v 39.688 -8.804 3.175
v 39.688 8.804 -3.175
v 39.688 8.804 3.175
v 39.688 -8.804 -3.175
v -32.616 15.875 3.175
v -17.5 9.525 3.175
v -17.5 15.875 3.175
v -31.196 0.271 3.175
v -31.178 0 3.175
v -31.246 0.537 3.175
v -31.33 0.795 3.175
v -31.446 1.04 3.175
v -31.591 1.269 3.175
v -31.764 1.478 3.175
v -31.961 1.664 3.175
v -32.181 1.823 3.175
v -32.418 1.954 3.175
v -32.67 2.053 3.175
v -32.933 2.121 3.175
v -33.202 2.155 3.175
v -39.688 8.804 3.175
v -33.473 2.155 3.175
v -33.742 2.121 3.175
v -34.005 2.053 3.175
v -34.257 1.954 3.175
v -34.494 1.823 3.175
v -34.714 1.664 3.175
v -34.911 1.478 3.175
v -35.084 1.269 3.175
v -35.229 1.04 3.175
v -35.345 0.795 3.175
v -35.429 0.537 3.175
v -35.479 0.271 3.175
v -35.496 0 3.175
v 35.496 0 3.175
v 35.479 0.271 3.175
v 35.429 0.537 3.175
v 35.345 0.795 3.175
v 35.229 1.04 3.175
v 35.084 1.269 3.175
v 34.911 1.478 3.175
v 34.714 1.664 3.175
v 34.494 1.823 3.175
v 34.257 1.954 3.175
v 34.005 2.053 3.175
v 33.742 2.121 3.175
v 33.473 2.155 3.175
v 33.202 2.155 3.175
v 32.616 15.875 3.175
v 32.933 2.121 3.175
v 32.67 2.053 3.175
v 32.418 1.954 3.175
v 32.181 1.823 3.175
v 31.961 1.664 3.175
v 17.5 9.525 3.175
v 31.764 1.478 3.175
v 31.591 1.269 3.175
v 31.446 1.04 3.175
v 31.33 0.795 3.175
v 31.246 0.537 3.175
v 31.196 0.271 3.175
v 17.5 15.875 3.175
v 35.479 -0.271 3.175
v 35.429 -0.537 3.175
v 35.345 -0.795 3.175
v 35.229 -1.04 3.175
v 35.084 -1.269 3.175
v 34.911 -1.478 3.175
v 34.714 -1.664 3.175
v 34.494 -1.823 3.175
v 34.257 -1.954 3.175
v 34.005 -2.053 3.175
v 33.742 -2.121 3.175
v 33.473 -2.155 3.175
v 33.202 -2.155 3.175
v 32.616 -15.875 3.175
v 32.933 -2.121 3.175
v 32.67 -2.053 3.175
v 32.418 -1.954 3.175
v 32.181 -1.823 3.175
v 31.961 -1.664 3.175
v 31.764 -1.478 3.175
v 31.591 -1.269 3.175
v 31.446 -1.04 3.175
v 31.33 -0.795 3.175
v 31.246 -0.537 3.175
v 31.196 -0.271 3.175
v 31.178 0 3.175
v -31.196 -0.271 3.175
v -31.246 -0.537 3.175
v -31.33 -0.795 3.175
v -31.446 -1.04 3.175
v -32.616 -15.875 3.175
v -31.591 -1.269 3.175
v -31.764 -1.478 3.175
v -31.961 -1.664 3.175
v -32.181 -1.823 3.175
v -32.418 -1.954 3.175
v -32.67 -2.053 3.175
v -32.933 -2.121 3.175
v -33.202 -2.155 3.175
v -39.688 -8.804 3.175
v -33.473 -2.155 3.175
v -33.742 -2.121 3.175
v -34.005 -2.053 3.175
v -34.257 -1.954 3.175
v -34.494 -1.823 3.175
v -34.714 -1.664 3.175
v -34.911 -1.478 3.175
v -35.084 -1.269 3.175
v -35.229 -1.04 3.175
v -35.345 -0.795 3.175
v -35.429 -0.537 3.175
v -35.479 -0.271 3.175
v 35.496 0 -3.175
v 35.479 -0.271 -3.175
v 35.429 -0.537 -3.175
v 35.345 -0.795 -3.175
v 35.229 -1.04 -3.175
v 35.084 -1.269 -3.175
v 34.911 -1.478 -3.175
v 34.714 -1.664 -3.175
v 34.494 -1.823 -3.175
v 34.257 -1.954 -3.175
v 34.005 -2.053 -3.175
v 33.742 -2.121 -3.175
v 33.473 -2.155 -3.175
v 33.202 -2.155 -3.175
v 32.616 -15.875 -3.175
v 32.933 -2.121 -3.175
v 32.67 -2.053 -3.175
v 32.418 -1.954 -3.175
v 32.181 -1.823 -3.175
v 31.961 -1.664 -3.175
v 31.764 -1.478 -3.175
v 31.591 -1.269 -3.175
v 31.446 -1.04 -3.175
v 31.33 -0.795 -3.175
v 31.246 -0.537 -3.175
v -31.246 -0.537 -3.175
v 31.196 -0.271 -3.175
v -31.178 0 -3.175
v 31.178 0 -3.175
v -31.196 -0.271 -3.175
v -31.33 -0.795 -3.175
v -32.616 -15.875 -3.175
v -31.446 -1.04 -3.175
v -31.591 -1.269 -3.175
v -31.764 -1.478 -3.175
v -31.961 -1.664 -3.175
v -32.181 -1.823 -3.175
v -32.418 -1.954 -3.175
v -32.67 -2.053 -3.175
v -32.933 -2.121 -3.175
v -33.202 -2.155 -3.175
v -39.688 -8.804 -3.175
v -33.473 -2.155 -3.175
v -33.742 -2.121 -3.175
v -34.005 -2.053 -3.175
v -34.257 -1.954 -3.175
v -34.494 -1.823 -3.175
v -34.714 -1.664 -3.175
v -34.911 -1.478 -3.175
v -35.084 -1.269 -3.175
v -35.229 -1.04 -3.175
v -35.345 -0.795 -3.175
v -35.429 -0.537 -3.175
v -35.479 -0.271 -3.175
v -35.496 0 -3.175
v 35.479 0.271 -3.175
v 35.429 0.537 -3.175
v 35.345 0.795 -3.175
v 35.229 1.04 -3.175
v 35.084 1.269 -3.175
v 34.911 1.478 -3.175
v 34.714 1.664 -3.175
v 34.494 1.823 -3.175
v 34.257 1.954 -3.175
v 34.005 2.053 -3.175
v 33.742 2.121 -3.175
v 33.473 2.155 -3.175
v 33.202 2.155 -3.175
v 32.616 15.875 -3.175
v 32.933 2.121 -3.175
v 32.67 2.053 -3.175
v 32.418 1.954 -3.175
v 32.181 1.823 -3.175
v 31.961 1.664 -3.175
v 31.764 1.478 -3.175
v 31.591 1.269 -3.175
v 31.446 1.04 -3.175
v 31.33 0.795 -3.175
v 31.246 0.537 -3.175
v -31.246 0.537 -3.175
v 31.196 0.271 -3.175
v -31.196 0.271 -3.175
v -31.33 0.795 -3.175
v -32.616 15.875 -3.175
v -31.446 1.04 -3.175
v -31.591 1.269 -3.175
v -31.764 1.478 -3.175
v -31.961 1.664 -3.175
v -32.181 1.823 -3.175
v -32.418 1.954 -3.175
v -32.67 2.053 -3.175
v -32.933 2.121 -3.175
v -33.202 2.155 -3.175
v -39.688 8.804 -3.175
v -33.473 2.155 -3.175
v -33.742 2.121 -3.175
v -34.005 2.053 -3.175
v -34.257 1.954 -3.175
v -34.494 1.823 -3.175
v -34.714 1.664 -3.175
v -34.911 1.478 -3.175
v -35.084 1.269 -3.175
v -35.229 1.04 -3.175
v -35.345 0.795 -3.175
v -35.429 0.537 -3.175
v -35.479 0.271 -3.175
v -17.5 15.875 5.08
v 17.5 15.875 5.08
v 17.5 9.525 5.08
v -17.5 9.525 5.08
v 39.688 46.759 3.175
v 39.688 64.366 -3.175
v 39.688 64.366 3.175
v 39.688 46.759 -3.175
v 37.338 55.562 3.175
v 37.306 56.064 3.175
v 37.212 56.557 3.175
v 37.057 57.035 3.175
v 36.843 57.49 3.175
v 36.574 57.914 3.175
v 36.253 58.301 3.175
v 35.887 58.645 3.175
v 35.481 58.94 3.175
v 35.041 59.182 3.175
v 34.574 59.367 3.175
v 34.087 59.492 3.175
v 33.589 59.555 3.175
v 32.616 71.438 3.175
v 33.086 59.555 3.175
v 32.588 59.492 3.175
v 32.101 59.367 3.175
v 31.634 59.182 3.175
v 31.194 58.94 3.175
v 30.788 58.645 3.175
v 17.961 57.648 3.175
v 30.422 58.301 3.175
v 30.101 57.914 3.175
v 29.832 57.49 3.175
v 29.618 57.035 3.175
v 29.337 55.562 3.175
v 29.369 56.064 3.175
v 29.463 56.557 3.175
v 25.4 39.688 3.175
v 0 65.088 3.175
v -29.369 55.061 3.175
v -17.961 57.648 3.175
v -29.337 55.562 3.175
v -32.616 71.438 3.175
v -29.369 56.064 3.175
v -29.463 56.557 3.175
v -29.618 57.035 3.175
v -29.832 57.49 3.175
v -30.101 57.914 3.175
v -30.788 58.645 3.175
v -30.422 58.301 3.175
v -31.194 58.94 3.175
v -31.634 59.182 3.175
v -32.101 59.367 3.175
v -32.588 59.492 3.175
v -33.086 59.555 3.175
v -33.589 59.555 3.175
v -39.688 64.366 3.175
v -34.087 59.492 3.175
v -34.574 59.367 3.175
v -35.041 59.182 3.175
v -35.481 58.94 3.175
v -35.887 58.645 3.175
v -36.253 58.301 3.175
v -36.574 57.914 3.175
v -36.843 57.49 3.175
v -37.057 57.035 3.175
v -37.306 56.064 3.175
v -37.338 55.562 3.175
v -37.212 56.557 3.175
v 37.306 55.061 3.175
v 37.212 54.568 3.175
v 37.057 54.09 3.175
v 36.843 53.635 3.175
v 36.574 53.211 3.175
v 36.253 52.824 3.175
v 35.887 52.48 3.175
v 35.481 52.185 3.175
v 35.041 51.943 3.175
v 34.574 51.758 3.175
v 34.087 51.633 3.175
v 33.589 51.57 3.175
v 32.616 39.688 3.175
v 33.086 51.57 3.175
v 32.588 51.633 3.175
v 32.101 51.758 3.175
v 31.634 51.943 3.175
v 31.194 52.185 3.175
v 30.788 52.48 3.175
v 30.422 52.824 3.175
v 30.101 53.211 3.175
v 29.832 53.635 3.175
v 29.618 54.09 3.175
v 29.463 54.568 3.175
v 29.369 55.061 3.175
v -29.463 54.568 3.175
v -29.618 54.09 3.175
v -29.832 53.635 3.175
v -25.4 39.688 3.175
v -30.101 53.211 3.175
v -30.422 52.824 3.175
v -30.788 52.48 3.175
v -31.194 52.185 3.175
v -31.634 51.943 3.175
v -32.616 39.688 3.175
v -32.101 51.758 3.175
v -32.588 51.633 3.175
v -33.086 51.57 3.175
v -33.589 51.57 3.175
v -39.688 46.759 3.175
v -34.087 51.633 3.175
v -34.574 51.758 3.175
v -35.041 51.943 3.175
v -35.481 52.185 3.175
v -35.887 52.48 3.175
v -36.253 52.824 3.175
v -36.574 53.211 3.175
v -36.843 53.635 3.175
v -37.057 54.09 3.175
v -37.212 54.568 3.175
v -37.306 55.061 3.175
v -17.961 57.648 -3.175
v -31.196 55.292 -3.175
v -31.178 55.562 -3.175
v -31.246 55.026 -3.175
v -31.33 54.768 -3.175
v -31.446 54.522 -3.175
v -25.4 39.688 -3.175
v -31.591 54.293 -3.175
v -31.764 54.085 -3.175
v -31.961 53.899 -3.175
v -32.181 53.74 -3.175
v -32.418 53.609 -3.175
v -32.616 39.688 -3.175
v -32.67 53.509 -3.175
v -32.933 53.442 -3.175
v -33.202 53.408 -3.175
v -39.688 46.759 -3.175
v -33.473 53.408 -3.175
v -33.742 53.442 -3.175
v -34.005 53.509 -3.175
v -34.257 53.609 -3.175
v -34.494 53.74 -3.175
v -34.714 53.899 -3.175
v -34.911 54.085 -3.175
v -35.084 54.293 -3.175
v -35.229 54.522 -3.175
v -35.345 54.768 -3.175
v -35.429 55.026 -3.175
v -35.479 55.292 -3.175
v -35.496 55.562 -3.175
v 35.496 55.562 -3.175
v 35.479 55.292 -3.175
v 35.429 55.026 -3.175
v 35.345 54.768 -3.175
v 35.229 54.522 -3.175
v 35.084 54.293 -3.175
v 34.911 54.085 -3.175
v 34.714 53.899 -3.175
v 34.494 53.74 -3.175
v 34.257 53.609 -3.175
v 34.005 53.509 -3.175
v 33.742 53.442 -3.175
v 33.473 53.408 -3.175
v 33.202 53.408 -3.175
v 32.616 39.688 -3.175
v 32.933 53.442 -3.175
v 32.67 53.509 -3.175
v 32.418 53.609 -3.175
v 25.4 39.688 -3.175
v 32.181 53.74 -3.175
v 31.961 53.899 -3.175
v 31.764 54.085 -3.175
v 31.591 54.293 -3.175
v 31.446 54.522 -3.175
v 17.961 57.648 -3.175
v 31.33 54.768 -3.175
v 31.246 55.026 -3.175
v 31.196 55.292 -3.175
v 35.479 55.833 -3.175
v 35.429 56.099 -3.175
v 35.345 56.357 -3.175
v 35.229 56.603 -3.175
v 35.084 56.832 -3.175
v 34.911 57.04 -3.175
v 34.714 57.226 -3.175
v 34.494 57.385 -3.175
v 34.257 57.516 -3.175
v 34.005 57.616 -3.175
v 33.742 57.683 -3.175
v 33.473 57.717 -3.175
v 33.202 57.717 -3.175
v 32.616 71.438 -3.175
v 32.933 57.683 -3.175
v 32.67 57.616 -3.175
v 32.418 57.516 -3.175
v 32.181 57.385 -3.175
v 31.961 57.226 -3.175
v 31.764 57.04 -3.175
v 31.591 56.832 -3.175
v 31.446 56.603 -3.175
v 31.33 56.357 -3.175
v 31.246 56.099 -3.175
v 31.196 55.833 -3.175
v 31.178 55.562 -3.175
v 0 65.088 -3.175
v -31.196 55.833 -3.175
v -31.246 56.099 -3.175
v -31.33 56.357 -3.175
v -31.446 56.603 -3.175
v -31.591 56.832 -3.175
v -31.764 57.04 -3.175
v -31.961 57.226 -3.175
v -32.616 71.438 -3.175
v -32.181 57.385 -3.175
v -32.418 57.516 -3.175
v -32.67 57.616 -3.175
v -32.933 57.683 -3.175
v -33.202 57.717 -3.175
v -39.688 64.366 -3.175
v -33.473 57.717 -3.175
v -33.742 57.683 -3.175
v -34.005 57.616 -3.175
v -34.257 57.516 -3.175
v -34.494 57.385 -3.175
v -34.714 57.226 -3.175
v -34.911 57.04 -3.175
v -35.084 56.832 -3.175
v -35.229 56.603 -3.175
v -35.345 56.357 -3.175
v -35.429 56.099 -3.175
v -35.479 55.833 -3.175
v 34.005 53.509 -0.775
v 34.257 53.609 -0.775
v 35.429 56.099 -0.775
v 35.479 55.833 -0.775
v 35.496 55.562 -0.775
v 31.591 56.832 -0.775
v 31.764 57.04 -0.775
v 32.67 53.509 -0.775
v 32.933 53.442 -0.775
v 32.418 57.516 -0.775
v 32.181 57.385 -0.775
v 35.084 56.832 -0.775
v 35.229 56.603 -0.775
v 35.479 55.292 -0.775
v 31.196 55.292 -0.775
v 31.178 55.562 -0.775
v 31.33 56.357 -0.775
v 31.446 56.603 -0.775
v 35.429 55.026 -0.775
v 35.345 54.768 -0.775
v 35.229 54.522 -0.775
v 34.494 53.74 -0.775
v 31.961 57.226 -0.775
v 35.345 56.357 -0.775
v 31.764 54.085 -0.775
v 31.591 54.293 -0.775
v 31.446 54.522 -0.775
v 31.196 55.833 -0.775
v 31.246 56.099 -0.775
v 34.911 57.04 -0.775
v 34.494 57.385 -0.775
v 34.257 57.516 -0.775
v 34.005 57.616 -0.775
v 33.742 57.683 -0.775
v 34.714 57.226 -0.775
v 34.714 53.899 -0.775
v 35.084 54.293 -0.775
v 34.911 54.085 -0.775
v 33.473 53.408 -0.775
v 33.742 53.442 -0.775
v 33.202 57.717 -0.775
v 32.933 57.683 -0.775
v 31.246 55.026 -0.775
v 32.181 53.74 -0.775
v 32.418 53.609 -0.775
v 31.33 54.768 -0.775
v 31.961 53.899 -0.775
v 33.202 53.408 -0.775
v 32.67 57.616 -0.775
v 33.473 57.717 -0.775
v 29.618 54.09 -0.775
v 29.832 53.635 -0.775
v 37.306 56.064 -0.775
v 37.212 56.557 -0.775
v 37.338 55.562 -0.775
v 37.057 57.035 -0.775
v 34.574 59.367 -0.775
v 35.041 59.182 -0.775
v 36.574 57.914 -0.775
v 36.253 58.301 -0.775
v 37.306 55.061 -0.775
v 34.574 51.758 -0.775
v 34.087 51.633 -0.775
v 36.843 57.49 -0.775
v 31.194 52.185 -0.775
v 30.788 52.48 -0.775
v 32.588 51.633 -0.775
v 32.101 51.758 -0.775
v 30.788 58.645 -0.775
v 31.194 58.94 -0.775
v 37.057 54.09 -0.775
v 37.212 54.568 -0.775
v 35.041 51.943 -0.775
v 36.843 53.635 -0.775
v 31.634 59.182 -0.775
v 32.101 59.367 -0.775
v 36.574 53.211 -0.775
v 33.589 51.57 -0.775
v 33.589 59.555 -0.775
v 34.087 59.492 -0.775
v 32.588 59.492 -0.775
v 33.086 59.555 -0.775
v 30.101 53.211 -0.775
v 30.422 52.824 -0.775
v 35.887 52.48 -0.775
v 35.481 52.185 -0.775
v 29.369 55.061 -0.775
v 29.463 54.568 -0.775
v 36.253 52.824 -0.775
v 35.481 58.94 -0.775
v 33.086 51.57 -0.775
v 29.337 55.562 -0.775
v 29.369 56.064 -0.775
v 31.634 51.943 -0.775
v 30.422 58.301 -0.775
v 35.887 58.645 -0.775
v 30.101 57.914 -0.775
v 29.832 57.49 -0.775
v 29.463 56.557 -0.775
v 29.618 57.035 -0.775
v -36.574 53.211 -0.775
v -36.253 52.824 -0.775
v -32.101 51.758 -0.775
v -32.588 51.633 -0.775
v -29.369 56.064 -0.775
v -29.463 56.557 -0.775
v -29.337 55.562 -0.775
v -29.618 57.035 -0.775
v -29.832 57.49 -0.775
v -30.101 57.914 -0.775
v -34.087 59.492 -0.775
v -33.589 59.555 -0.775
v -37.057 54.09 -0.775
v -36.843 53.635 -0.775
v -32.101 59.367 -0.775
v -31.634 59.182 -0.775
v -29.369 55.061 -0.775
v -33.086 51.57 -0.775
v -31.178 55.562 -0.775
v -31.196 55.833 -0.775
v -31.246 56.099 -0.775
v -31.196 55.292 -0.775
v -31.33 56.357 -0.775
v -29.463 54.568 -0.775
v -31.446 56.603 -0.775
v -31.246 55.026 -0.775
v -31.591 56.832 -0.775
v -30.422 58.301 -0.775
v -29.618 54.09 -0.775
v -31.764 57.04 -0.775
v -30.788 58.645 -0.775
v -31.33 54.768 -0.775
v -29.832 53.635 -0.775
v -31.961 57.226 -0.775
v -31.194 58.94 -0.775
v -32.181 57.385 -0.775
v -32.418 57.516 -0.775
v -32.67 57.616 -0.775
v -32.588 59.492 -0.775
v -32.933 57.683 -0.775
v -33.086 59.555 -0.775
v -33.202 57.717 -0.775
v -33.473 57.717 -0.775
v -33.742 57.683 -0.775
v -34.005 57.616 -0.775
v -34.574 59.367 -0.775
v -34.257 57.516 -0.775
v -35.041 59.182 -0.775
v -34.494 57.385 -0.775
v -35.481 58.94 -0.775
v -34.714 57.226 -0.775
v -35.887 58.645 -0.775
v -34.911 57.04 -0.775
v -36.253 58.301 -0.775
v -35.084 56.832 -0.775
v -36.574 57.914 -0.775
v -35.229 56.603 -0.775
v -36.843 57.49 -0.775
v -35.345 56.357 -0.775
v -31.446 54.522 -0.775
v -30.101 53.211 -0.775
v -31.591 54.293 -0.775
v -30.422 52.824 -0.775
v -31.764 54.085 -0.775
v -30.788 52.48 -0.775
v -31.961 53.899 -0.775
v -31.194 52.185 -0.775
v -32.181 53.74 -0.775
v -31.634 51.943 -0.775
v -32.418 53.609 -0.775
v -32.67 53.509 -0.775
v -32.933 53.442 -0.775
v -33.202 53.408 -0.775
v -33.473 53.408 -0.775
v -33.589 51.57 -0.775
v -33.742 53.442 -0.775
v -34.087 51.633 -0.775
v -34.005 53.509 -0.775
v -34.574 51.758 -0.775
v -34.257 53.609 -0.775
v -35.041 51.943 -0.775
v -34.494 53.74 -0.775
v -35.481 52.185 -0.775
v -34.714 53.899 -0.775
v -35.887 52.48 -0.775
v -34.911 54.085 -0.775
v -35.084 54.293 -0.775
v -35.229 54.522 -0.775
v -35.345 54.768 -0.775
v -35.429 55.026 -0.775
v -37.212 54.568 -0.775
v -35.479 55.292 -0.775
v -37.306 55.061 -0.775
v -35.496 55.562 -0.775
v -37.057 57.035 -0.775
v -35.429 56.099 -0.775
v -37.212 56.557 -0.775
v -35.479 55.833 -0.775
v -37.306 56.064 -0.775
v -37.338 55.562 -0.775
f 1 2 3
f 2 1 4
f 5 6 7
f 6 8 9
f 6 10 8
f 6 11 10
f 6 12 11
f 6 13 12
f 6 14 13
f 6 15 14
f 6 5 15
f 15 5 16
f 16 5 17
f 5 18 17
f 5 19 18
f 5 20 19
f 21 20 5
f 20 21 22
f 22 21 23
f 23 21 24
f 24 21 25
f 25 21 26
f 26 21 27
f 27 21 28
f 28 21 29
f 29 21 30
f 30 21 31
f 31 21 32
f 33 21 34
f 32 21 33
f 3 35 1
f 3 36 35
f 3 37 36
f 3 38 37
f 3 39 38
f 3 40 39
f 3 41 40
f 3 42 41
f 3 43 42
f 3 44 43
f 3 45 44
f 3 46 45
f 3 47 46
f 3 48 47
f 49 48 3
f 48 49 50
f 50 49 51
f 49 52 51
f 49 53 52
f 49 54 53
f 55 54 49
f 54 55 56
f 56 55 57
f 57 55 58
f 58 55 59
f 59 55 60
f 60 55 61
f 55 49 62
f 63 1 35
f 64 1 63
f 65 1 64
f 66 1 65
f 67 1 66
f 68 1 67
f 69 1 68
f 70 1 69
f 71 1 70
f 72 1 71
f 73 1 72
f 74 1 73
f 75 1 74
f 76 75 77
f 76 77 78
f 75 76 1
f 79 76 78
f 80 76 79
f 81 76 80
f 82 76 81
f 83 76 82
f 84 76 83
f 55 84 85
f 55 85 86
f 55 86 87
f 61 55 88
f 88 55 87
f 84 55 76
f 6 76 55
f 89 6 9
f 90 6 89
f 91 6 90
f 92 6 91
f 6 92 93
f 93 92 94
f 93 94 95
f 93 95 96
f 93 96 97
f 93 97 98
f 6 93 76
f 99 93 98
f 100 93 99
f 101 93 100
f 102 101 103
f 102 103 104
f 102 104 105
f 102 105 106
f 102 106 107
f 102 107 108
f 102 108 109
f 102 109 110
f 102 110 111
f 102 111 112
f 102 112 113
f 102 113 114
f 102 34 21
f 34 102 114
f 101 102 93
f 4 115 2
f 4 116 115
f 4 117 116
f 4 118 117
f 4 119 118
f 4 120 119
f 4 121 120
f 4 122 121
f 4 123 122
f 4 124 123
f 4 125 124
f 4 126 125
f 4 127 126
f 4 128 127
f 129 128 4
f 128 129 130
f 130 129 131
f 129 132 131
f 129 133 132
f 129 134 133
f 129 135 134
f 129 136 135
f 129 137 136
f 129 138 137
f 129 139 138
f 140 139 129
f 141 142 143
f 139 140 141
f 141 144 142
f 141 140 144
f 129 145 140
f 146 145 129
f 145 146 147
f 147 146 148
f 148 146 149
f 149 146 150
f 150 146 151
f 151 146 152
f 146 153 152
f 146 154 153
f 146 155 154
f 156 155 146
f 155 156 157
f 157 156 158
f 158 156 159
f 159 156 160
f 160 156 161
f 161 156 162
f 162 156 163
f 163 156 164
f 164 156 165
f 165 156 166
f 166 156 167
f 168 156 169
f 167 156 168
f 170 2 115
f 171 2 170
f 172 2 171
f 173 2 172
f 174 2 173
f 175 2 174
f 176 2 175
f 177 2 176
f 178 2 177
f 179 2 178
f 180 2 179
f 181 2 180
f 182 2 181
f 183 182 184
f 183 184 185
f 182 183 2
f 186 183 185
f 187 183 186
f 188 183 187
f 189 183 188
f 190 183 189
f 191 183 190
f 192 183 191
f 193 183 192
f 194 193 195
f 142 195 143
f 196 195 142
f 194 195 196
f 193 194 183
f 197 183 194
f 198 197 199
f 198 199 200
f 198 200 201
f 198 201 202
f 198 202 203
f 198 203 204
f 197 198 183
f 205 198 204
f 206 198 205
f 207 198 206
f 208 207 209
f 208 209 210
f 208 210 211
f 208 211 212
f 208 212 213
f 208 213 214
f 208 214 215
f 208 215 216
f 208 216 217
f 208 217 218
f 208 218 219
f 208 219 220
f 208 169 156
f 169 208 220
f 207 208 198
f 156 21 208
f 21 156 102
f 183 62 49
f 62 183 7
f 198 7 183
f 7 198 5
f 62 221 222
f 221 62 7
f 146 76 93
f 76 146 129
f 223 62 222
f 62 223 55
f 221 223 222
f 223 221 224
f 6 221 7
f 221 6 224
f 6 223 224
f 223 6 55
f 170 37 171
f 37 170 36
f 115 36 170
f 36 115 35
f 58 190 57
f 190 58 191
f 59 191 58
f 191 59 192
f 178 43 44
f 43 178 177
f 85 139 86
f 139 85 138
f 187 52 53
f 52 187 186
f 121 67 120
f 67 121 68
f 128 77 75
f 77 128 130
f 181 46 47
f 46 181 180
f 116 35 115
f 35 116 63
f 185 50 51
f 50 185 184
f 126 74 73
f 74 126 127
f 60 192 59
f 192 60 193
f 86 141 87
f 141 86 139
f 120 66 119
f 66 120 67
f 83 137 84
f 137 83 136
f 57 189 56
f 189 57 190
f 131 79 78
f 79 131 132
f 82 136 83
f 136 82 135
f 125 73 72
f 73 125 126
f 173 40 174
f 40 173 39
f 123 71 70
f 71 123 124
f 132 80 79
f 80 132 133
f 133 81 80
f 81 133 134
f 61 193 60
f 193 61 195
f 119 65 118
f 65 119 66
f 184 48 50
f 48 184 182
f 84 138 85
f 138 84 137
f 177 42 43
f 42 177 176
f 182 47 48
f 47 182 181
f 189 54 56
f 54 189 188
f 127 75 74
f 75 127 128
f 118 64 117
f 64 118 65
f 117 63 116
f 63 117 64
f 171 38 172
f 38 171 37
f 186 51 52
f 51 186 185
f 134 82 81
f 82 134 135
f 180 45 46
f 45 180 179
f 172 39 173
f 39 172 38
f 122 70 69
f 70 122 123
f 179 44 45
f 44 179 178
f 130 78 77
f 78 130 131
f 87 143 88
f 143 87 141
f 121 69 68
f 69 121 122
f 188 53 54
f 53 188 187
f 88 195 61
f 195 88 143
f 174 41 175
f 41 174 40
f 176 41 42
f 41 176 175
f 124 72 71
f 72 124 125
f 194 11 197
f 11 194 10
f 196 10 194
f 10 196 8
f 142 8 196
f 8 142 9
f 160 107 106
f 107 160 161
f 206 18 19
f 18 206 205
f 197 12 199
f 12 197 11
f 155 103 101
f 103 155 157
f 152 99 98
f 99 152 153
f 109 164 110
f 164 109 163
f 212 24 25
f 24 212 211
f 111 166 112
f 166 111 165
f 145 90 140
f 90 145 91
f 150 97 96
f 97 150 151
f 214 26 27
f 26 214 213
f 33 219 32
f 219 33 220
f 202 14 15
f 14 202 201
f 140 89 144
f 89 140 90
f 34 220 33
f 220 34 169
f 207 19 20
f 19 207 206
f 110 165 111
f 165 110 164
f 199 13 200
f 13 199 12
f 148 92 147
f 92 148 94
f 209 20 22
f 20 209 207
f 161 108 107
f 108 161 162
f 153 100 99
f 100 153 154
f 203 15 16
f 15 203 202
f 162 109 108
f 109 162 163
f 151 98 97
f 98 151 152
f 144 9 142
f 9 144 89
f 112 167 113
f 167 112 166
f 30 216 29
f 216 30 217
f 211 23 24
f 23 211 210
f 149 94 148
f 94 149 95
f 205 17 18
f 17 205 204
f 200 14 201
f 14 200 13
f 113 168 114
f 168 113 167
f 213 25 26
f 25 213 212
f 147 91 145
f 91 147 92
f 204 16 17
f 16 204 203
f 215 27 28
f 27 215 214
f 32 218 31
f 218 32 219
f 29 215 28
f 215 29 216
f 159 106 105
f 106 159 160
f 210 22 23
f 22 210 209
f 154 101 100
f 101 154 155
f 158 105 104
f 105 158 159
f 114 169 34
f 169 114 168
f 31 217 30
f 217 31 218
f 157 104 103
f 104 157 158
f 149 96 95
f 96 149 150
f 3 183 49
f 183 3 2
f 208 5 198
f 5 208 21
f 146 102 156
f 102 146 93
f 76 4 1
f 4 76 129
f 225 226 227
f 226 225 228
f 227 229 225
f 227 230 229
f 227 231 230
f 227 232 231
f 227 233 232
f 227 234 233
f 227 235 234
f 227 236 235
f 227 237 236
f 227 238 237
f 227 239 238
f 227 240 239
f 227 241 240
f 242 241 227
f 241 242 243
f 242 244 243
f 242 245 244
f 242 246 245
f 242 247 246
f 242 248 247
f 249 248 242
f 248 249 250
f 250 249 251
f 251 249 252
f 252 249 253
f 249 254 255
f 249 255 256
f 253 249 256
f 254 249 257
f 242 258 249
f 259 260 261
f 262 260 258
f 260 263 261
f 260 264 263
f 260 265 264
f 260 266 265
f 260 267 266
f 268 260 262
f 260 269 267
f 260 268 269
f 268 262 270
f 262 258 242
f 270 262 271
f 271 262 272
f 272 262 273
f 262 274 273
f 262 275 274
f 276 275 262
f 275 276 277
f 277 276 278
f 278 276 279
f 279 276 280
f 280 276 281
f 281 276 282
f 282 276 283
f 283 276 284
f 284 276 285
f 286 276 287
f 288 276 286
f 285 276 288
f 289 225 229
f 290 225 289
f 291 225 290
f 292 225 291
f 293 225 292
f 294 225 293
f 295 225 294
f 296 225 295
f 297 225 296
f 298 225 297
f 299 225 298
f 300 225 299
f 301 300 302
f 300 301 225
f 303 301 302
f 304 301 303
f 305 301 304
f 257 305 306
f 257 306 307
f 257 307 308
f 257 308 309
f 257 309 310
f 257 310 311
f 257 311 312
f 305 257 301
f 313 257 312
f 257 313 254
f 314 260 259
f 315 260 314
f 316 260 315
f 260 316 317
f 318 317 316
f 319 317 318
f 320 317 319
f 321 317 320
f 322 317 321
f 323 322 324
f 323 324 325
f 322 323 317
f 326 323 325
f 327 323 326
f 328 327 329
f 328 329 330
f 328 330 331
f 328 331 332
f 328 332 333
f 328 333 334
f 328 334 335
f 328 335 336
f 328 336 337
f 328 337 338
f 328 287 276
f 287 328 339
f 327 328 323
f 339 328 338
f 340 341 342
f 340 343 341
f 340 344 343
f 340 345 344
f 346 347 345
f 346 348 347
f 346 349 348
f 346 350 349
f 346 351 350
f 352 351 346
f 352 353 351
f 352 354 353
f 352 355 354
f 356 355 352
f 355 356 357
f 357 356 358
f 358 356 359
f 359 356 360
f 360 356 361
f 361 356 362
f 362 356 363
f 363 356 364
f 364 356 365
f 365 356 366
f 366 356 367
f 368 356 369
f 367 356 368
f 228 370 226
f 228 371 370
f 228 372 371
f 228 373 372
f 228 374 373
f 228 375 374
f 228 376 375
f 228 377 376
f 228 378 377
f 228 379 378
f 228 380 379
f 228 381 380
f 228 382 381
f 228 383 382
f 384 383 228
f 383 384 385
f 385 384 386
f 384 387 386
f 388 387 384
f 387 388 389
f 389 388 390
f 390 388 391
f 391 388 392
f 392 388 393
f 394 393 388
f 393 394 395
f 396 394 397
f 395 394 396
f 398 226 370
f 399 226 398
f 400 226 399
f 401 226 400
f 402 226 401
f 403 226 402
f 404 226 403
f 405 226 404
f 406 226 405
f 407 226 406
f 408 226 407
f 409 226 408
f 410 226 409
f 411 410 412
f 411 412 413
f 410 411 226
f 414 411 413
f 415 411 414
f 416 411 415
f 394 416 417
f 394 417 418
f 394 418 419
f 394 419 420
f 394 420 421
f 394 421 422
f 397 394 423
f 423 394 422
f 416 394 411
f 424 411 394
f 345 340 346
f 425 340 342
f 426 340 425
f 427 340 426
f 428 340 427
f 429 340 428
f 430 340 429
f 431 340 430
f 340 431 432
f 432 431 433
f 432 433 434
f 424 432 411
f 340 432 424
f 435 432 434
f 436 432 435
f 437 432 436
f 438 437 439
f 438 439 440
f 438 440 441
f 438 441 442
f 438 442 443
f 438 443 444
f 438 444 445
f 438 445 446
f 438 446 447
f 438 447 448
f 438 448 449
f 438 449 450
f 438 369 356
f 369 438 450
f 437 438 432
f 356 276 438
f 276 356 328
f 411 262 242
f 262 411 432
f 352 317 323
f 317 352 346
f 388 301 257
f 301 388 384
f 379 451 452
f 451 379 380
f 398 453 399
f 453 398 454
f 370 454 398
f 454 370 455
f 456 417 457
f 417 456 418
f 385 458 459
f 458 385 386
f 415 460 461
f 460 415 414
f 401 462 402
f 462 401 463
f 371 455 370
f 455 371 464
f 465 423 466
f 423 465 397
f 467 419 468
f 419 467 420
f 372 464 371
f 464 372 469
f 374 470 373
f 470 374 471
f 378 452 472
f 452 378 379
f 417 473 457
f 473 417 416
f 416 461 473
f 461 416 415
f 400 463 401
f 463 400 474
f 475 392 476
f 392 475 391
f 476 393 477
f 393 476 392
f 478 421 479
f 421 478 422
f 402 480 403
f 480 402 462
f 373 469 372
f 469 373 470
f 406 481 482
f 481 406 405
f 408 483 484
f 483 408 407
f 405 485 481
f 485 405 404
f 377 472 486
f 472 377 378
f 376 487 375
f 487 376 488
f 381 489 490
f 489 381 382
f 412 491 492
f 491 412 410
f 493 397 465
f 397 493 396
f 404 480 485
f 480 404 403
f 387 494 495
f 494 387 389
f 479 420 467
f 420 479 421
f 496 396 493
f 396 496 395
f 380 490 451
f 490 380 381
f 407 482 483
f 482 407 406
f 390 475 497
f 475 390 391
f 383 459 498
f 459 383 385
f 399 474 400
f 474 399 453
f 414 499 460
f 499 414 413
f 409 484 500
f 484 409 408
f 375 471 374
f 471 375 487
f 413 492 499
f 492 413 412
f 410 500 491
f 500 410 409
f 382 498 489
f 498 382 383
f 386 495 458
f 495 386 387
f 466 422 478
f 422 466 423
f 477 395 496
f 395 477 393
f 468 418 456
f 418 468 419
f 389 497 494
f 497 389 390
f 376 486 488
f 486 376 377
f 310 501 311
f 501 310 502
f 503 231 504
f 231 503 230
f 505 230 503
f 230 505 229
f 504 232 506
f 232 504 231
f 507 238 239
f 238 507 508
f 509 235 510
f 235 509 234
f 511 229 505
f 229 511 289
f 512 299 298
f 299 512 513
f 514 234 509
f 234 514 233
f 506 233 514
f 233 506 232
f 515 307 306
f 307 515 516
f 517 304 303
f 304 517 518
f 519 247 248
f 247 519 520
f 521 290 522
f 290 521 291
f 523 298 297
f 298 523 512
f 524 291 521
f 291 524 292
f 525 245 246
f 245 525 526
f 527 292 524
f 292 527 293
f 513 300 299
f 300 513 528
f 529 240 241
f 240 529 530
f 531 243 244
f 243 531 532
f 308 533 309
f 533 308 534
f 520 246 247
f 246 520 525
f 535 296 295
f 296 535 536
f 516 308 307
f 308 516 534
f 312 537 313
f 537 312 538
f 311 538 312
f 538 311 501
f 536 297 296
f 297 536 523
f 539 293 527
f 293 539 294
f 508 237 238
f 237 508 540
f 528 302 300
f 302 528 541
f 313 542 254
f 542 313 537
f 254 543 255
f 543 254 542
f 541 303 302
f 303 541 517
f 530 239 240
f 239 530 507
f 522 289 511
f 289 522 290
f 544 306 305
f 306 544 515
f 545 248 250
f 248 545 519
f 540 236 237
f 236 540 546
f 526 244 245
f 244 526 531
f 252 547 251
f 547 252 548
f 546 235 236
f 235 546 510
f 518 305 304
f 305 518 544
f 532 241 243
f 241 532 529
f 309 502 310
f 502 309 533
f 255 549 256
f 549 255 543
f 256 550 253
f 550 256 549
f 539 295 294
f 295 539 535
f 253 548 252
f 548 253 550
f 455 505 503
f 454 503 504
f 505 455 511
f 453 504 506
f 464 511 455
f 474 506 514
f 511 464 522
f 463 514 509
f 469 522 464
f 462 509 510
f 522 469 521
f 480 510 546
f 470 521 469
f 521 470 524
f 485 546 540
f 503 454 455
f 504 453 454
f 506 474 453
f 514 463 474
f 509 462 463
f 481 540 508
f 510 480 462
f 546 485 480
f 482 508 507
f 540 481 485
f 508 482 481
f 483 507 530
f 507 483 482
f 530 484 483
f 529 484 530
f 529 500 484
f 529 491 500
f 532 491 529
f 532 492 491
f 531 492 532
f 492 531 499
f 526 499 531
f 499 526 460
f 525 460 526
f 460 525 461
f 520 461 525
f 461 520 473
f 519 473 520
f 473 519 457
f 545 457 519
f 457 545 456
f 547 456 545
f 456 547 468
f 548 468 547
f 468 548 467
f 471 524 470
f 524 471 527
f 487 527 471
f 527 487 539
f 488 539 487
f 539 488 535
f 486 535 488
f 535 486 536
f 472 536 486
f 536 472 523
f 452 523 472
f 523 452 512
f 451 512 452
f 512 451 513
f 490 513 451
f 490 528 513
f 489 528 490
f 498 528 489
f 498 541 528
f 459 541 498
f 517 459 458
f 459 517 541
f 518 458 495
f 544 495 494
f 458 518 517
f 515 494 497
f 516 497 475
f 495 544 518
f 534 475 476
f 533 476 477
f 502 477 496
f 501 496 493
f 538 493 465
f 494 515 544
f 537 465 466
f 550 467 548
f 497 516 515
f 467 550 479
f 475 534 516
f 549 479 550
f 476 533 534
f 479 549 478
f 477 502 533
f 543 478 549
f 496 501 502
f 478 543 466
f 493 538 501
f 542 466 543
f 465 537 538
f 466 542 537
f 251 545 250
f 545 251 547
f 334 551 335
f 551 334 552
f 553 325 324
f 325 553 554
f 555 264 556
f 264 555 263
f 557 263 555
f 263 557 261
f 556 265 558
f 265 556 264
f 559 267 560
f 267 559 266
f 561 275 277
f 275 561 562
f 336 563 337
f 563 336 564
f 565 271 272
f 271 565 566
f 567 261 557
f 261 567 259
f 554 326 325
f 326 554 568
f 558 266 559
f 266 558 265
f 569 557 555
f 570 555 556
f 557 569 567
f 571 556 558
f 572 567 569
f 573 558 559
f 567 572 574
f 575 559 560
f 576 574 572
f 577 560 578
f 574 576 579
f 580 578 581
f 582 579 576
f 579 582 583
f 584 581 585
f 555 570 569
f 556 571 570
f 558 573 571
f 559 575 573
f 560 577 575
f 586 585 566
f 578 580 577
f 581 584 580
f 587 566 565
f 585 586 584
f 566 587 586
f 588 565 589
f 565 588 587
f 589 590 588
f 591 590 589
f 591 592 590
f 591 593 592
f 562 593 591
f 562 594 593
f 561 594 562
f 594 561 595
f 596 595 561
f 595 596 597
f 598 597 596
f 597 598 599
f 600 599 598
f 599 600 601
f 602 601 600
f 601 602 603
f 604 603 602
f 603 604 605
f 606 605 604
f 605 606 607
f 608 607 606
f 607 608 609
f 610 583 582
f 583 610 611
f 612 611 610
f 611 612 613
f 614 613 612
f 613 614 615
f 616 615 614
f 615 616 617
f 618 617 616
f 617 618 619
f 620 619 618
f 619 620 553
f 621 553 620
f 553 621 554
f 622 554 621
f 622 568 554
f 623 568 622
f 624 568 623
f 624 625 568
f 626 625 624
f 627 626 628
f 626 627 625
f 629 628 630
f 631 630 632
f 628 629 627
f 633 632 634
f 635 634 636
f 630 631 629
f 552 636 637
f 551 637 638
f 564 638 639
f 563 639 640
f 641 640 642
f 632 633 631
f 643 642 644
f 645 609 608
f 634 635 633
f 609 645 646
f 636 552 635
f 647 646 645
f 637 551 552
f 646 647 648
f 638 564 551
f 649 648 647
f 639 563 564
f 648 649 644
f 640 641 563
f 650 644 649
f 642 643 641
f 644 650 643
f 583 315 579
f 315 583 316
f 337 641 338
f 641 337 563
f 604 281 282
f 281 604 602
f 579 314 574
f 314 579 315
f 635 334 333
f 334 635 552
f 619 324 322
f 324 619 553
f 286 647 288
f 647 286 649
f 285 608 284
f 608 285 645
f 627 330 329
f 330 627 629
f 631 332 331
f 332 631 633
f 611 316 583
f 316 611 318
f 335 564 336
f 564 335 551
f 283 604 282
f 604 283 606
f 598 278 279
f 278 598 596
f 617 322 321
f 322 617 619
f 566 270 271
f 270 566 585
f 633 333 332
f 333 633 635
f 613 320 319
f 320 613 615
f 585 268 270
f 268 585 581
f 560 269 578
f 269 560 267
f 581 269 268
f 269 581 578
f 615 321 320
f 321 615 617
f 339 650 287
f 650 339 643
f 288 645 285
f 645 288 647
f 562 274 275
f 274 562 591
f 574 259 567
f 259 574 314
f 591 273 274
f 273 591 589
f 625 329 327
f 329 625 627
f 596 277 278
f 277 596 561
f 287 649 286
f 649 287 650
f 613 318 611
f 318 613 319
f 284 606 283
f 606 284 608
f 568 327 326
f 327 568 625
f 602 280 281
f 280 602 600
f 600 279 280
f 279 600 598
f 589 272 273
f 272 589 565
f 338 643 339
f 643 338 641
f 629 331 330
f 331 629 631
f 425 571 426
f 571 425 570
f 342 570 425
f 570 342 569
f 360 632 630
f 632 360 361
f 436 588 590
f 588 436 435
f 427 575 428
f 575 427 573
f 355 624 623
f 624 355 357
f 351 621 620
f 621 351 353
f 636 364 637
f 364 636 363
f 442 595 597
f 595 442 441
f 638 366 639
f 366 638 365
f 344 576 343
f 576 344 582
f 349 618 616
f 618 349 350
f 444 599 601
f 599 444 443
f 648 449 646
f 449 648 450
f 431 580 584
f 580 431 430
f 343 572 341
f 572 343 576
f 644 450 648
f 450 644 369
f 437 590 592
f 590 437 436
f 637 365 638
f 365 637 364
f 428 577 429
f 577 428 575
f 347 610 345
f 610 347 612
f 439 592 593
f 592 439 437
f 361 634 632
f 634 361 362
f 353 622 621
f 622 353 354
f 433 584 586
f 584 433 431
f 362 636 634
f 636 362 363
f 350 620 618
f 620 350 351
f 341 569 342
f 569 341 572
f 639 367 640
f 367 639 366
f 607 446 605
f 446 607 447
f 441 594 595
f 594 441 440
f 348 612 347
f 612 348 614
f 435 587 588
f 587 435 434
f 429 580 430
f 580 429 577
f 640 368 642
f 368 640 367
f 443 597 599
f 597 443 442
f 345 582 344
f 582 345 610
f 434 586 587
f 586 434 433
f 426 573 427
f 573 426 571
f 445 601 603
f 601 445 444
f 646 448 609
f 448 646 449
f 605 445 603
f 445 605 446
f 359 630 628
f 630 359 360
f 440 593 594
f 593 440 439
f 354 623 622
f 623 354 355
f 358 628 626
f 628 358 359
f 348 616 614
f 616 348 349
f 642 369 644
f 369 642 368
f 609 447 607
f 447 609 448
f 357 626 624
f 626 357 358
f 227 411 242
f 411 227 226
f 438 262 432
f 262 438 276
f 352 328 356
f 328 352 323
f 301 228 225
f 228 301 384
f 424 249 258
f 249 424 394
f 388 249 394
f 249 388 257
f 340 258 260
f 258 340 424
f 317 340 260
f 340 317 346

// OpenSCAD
/***********************************************************************
Name ......... : keyHolder.scad
Description....: Parametric Key Holder
Author ....... : Garrett Melenka
Version ...... : V1.0 2017/05/21
Licence ...... : GPL
***********************************************************************/


//Length of Key Holder
Length = 79.375;
//Width of Key Holder
Width = 31.75;

//Thickness of Holder Plates
Thickness = 6.350;

//Measured Thickness of Keys
keyThickness = 1.905;

//Length of Spacer to stop keys
keySpacerLength = 35;
//Width of key spacer
keySpaceWidth = 6.35;


//Measured bolt diameter- undersize so bolt with thread into hole
boltDiameter = 4.318;
//Measured length of bolt
boltLength = Thickness+1;
//Measured diameter of bolt head
boltHeadDiameter= 8.0;
//Measured bolt head thickness
boltHeadThickness = 4.75;
//Offset of bolts from sides of hey holder
boltOffset = 6.35;

//Diameter of thumb hole
thumbHoleDiameter = 50.8;
//Change number of facets for key thumb hole
thumHoleNumSides = 8; //[3:1:100]

//Chamfer Angle
chamferAngle=45;
//Chamfer Width
chamferWidth = 10;


module keyHolderBottom()
{
    
    difference(){
    union(){
    cube([Length, Width, Thickness], center = true);
    
    
    translate([0,Width*0.5-keySpaceWidth*0.5,Thickness*0.5+keyThickness*0.5]){
    cube([keySpacerLength, keySpaceWidth, keyThickness], center = true);
    }
    }
    
    translate([Length*0.5-boltOffset,0,0])
    {
    cylinder(r = boltDiameter*0.5, h = boltLength, center=true, $fn=50);
    }
 
    translate([-Length*0.5+boltOffset,0,0])
    {
    cylinder(r = boltDiameter*0.5, h = boltLength, center=true, $fn=50);
    }

    translate([Length*0.5, Width*0.5,0]){
    rotate([0,0,chamferAngle]){
    cube([chamferWidth, chamferWidth, Thickness+1], center= true);    
    }
    }
    
    translate([-Length*0.5, Width*0.5,0]){
    rotate([0,0,chamferAngle]){
    cube([chamferWidth, chamferWidth, Thickness+1], center= true);    
    }
    }
    
    translate([-Length*0.5, -Width*0.5,0]){
    rotate([0,0,chamferAngle]){
    cube([chamferWidth, chamferWidth, Thickness+1], center= true);    
    }
    }
    
    translate([Length*0.5, -Width*0.5,0]){
    rotate([0,0,chamferAngle]){
    cube([chamferWidth, chamferWidth, Thickness+1], center= true);    
    }
    }
    
    
    
    }
    
}



module keyHolderTop()
{
    
    difference(){
    cube([Length, Width, Thickness], center = true);
    
    translate([Length*0.5-boltOffset,0,0])
    {
    cylinder(r = boltDiameter*0.5, h = boltLength, center=true, $fn=50);
    }
    
    translate([Length*0.5-boltOffset,0,Thickness-boltHeadThickness])
    {
    cylinder(r = boltHeadDiameter*0.5, h = boltHeadThickness, center=true, $fn=50);
    }
    
    
 
    translate([-Length*0.5+boltOffset,0,Thickness-boltHeadThickness])
    {
    cylinder(r = boltHeadDiameter*0.5, h = boltHeadThickness, center=true, $fn=50);
    }
    
    translate([-Length*0.5+boltOffset,0,0])
    {
    cylinder(r = boltDiameter*0.5, h = boltLength, center=true, $fn=50);
    }

    translate([Length*0.5, Width*0.5,0]){
    rotate([0,0,chamferAngle]){
    cube([chamferWidth, chamferWidth, Thickness+1], center= true);    
    }
    }
    
    translate([-Length*0.5, Width*0.5,0]){
    rotate([0,0,chamferAngle]){
    cube([chamferWidth, chamferWidth, Thickness+1], center= true);    
    }
    }
    
    translate([-Length*0.5, -Width*0.5,0]){
    rotate([0,0,chamferAngle]){
    cube([chamferWidth, chamferWidth, Thickness+1], center= true);    
    }
    }
    
    translate([Length*0.5, -Width*0.5,0]){
    rotate([0,0,chamferAngle]){
    cube([chamferWidth, chamferWidth, Thickness+1], center= true);    
    }
    }
    
    
    translate([0,-Width*0.5,0]){
    cylinder(r=thumbHoleDiameter*0.5, h=Thickness+1, center=true, $fn=thumHoleNumSides);
    }
    
    
    }
    
    
    
}



keyHolderBottom();


translate([0, Width*1.75, 0]){
keyHolderTop();
}
